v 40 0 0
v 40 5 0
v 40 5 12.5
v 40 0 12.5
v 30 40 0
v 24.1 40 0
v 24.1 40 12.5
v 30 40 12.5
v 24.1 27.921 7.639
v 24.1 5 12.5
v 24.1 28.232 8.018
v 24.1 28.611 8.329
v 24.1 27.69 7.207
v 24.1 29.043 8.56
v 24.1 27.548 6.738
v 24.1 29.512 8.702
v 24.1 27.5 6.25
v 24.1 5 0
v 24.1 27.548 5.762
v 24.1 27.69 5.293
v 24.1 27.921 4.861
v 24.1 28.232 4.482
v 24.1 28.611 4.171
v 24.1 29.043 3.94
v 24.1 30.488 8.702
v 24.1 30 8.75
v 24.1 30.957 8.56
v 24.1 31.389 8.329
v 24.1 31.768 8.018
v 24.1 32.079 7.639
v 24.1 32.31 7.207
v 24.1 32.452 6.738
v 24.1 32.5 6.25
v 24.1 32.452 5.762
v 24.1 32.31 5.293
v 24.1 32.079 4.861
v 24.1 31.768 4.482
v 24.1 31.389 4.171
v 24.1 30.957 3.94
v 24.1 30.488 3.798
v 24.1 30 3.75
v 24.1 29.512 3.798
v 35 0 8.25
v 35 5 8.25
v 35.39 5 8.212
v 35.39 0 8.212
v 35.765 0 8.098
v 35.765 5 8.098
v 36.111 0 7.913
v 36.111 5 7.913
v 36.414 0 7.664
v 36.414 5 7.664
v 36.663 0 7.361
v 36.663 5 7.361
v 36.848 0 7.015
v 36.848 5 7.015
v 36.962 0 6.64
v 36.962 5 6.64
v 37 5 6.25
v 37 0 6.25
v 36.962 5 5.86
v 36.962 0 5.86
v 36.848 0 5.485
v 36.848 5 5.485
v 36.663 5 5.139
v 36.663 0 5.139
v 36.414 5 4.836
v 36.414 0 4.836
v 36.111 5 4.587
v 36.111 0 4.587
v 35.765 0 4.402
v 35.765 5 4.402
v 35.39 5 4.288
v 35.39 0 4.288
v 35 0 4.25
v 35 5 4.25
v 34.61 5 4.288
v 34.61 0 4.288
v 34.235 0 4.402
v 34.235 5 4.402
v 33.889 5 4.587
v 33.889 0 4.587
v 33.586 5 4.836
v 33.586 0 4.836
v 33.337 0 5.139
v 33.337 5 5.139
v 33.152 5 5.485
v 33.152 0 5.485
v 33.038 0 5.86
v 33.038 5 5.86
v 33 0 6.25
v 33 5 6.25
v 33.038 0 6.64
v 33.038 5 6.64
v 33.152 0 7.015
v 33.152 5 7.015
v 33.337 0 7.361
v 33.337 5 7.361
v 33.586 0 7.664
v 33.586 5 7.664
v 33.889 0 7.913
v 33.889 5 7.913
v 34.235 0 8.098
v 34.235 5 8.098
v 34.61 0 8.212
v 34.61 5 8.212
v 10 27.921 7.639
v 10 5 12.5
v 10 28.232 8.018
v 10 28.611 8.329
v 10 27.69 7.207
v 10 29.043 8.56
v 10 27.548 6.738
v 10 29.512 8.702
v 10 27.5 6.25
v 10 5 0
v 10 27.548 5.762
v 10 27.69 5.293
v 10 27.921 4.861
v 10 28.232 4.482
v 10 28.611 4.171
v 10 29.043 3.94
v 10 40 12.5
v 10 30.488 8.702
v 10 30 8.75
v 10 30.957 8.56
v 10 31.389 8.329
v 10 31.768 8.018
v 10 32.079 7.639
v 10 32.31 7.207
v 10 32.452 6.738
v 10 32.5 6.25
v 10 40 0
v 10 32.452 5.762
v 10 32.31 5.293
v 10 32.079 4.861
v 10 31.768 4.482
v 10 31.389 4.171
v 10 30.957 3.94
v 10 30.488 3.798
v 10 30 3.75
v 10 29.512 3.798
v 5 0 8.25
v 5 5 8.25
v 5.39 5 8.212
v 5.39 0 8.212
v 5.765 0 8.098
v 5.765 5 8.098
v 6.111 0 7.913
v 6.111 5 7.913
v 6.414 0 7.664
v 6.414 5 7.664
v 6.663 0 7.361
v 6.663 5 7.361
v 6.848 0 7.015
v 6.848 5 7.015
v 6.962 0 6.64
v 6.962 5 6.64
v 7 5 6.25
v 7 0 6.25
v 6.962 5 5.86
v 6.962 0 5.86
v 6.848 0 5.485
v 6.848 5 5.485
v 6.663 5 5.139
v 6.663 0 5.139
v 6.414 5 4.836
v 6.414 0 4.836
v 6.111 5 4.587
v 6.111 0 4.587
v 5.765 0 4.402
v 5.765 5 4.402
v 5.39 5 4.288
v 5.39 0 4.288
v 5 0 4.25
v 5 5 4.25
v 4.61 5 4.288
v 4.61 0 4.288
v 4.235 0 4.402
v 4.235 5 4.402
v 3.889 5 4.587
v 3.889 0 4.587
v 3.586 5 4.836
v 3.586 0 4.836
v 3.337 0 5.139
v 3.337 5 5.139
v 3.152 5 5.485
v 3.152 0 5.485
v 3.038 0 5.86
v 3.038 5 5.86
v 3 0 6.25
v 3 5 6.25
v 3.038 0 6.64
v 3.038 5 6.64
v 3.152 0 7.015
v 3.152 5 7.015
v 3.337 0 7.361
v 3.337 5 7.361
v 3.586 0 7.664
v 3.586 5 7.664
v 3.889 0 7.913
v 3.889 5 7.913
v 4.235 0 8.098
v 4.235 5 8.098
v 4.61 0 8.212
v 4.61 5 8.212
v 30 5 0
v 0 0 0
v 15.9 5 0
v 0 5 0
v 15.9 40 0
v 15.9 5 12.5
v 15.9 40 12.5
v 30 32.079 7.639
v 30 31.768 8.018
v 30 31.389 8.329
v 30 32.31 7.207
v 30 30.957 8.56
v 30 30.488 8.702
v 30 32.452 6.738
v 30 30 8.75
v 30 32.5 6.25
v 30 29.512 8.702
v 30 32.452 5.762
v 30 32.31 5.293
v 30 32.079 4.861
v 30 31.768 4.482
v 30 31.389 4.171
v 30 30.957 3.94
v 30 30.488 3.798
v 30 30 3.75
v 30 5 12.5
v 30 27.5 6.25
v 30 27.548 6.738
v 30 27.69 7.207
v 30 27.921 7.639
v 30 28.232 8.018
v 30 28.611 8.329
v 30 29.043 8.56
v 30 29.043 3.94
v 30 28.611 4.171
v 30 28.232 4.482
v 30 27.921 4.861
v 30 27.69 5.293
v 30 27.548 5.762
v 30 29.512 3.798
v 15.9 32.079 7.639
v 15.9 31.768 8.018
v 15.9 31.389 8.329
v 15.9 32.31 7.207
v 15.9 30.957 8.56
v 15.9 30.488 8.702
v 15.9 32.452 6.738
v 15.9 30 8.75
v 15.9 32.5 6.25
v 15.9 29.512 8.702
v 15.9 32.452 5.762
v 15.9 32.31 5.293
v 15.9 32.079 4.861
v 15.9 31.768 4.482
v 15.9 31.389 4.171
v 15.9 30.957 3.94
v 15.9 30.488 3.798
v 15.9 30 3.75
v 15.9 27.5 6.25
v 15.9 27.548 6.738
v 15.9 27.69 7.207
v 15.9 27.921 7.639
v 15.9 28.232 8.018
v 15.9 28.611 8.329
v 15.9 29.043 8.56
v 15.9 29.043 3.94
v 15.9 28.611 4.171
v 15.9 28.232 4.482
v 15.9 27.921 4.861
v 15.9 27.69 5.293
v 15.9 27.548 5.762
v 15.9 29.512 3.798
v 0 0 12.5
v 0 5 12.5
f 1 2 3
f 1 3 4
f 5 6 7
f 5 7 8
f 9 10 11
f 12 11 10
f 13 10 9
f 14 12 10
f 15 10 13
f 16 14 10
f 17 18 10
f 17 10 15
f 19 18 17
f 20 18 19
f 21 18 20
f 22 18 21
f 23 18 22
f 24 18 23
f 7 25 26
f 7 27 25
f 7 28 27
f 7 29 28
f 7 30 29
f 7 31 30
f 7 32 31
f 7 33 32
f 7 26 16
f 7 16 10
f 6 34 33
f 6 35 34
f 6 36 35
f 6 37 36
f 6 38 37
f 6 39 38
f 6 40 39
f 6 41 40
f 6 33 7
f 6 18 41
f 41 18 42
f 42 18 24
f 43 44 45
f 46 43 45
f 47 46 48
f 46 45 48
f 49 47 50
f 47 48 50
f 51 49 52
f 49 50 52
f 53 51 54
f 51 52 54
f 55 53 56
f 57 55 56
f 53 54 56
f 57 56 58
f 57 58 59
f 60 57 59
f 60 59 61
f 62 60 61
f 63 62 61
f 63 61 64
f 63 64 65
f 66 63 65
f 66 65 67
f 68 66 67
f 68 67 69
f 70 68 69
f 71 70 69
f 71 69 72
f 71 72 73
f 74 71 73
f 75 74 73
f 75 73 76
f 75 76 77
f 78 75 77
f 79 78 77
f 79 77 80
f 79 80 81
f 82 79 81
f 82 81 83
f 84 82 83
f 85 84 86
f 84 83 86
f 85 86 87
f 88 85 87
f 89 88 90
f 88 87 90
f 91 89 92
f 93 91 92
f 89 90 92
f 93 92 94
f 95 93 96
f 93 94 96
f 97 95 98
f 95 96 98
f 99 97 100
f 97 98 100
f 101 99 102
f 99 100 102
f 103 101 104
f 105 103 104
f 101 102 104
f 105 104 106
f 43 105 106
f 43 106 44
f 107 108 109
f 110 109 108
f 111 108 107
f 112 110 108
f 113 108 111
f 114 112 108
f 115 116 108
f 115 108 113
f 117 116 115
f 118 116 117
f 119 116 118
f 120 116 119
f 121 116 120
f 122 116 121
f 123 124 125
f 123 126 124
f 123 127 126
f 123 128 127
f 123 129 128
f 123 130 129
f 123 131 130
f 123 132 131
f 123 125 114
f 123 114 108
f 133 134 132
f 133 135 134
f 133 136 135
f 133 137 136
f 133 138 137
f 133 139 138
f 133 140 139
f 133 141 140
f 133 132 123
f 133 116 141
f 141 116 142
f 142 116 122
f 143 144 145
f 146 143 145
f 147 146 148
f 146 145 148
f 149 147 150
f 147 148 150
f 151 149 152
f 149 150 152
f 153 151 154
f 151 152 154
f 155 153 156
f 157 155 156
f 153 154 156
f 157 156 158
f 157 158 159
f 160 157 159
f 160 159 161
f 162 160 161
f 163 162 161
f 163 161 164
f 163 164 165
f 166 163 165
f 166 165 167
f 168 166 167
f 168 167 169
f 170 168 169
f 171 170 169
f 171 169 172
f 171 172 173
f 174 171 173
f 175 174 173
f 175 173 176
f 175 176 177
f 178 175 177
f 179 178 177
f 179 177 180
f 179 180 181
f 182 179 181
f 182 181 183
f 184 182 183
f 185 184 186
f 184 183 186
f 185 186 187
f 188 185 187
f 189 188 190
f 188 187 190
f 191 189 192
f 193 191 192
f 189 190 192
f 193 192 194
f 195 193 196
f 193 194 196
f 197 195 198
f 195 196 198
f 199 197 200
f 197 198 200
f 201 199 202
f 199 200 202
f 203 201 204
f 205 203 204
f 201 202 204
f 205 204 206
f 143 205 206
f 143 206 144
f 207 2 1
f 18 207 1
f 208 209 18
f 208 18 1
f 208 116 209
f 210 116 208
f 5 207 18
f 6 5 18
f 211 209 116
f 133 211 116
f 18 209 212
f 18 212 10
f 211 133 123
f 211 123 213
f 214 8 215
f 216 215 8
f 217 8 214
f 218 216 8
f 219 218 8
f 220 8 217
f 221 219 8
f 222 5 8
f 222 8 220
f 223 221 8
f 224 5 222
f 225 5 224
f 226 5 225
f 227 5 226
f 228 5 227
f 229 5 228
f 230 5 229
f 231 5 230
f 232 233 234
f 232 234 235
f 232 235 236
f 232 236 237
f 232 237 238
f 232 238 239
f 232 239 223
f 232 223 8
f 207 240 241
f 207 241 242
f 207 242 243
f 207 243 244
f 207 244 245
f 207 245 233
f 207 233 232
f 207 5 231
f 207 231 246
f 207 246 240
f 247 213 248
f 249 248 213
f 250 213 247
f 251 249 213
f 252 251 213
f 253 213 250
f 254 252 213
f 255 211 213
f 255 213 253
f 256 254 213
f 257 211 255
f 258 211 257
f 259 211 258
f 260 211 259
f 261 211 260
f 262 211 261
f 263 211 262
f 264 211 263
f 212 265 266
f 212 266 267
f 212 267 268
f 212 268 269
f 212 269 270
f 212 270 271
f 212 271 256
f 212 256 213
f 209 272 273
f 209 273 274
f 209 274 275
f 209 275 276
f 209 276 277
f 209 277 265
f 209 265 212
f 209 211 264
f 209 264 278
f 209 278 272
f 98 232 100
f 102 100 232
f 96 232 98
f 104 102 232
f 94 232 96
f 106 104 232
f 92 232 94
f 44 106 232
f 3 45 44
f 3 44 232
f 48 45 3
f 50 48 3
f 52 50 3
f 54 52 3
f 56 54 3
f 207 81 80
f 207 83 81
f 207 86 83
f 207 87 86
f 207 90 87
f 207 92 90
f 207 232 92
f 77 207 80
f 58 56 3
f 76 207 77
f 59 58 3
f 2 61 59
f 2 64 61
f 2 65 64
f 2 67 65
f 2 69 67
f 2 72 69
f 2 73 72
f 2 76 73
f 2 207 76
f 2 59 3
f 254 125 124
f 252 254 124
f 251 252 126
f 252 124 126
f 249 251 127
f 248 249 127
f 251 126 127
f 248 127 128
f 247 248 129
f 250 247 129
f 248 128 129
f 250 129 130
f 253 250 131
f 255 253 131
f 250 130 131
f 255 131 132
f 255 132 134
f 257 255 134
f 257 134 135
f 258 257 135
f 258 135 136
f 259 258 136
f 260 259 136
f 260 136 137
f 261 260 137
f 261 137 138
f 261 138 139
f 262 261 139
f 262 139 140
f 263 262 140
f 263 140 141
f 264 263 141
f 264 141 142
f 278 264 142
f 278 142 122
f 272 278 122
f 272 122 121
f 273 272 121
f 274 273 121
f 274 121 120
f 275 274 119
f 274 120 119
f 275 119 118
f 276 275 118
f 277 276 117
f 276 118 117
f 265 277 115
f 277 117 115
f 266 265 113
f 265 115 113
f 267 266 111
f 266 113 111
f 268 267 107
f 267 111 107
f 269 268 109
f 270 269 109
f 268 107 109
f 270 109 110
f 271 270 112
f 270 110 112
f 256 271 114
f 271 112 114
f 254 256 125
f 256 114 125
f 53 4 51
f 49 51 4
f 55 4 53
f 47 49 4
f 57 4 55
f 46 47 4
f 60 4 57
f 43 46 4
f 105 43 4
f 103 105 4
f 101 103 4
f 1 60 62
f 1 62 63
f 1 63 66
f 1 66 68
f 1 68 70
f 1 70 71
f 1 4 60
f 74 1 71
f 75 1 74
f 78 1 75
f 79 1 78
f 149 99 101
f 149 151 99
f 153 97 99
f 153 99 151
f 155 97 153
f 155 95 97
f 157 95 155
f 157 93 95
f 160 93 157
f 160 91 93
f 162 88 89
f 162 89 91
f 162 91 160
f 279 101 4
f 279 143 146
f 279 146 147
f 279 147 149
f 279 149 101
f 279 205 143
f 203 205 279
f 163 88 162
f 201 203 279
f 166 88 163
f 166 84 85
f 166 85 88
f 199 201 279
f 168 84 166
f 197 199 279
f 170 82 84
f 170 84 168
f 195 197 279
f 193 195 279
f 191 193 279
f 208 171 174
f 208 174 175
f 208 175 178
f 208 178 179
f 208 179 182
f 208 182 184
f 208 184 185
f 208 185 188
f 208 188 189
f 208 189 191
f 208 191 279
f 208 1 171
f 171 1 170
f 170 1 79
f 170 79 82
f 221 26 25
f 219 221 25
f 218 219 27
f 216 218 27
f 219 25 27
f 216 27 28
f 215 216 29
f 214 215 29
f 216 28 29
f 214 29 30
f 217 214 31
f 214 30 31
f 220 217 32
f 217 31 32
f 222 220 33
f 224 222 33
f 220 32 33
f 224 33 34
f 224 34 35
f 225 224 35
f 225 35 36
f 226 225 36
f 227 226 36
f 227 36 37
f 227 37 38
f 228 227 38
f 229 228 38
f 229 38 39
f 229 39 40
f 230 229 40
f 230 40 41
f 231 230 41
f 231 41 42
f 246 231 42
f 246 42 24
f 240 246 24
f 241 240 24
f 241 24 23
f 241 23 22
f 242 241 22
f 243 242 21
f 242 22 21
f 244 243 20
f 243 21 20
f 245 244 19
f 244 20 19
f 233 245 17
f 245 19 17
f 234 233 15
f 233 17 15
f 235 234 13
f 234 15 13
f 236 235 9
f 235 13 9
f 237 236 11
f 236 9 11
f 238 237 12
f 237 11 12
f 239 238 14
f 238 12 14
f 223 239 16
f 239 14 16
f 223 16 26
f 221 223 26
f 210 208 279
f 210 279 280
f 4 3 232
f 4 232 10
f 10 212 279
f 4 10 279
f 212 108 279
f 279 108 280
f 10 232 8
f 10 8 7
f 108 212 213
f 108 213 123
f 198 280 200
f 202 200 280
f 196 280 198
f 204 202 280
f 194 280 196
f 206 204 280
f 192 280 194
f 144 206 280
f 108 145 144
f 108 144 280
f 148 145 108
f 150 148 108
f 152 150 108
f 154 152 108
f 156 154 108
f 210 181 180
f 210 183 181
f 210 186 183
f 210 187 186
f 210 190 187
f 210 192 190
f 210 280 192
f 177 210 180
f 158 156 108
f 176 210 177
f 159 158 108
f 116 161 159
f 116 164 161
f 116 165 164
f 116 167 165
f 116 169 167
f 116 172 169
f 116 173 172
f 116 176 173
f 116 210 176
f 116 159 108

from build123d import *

# Parameters (mm, degrees)
EXTRUDE_1_DEPTH     = 12.5
SKETCH_2_R          = 2.5
CUT_EXTRUDE_2_DEPTH = 52.53882032
CUT_EXTRUDE_3_REACH = 56.601
SKETCH_3_R          = 2


with BuildPart() as part:
    # Эскиз1 → Вытянуть1 (new body)
    with BuildSketch(Plane.XY):
        Polygon((0, 0), (0, 5), (10, 5), (10, 40), (15.9, 40), (15.9, 5), (24.1, 5), (24.1, 40), (30, 40), (30, 5), (40, 5), (40, 0), align=None)
    extrude(amount=EXTRUDE_1_DEPTH)

    # Эскиз2 → Вытянуть2 (cut, through all)
    with BuildSketch(Plane.ZY.offset(-10)):
        with Locations((6.25, 30)):
            Circle(SKETCH_2_R)
    extrude(amount=-CUT_EXTRUDE_2_DEPTH, mode=Mode.SUBTRACT)

    # Эскиз3 → Вытянуть3 (cut, up to next)
    with BuildSketch(Plane(origin=(0, 5, 0), x_dir=(1, 0, 0), z_dir=(0, 1, 0)), mode=Mode.PRIVATE) as cut_extrude_3_sk1:
        with Locations(Location((35, -6.25, 0), (0, 0, 270))):
            Circle(SKETCH_3_R)
    cut_extrude_3_tool1 = extrude(cut_extrude_3_sk1.sketch, amount=-CUT_EXTRUDE_3_REACH, mode=Mode.PRIVATE) & part.part
    # Эскиз3 → Вытянуть3 (cut, up to next)
    with BuildSketch(Plane(origin=(0, 5, 0), x_dir=(1, 0, 0), z_dir=(0, 1, 0)), mode=Mode.PRIVATE) as cut_extrude_3_sk2:
        with Locations(Location((5, -6.25, 0), (0, 0, 270))):
            Circle(SKETCH_3_R)
    cut_extrude_3_tool2 = extrude(cut_extrude_3_sk2.sketch, amount=-CUT_EXTRUDE_3_REACH, mode=Mode.PRIVATE) & part.part
    add(cut_extrude_3_tool1.solids().sort_by_distance((35, 5, 6.25))[0], mode=Mode.SUBTRACT)
    add(cut_extrude_3_tool2.solids().sort_by_distance((5, 5, 6.25))[0], mode=Mode.SUBTRACT)


solid = part.part
